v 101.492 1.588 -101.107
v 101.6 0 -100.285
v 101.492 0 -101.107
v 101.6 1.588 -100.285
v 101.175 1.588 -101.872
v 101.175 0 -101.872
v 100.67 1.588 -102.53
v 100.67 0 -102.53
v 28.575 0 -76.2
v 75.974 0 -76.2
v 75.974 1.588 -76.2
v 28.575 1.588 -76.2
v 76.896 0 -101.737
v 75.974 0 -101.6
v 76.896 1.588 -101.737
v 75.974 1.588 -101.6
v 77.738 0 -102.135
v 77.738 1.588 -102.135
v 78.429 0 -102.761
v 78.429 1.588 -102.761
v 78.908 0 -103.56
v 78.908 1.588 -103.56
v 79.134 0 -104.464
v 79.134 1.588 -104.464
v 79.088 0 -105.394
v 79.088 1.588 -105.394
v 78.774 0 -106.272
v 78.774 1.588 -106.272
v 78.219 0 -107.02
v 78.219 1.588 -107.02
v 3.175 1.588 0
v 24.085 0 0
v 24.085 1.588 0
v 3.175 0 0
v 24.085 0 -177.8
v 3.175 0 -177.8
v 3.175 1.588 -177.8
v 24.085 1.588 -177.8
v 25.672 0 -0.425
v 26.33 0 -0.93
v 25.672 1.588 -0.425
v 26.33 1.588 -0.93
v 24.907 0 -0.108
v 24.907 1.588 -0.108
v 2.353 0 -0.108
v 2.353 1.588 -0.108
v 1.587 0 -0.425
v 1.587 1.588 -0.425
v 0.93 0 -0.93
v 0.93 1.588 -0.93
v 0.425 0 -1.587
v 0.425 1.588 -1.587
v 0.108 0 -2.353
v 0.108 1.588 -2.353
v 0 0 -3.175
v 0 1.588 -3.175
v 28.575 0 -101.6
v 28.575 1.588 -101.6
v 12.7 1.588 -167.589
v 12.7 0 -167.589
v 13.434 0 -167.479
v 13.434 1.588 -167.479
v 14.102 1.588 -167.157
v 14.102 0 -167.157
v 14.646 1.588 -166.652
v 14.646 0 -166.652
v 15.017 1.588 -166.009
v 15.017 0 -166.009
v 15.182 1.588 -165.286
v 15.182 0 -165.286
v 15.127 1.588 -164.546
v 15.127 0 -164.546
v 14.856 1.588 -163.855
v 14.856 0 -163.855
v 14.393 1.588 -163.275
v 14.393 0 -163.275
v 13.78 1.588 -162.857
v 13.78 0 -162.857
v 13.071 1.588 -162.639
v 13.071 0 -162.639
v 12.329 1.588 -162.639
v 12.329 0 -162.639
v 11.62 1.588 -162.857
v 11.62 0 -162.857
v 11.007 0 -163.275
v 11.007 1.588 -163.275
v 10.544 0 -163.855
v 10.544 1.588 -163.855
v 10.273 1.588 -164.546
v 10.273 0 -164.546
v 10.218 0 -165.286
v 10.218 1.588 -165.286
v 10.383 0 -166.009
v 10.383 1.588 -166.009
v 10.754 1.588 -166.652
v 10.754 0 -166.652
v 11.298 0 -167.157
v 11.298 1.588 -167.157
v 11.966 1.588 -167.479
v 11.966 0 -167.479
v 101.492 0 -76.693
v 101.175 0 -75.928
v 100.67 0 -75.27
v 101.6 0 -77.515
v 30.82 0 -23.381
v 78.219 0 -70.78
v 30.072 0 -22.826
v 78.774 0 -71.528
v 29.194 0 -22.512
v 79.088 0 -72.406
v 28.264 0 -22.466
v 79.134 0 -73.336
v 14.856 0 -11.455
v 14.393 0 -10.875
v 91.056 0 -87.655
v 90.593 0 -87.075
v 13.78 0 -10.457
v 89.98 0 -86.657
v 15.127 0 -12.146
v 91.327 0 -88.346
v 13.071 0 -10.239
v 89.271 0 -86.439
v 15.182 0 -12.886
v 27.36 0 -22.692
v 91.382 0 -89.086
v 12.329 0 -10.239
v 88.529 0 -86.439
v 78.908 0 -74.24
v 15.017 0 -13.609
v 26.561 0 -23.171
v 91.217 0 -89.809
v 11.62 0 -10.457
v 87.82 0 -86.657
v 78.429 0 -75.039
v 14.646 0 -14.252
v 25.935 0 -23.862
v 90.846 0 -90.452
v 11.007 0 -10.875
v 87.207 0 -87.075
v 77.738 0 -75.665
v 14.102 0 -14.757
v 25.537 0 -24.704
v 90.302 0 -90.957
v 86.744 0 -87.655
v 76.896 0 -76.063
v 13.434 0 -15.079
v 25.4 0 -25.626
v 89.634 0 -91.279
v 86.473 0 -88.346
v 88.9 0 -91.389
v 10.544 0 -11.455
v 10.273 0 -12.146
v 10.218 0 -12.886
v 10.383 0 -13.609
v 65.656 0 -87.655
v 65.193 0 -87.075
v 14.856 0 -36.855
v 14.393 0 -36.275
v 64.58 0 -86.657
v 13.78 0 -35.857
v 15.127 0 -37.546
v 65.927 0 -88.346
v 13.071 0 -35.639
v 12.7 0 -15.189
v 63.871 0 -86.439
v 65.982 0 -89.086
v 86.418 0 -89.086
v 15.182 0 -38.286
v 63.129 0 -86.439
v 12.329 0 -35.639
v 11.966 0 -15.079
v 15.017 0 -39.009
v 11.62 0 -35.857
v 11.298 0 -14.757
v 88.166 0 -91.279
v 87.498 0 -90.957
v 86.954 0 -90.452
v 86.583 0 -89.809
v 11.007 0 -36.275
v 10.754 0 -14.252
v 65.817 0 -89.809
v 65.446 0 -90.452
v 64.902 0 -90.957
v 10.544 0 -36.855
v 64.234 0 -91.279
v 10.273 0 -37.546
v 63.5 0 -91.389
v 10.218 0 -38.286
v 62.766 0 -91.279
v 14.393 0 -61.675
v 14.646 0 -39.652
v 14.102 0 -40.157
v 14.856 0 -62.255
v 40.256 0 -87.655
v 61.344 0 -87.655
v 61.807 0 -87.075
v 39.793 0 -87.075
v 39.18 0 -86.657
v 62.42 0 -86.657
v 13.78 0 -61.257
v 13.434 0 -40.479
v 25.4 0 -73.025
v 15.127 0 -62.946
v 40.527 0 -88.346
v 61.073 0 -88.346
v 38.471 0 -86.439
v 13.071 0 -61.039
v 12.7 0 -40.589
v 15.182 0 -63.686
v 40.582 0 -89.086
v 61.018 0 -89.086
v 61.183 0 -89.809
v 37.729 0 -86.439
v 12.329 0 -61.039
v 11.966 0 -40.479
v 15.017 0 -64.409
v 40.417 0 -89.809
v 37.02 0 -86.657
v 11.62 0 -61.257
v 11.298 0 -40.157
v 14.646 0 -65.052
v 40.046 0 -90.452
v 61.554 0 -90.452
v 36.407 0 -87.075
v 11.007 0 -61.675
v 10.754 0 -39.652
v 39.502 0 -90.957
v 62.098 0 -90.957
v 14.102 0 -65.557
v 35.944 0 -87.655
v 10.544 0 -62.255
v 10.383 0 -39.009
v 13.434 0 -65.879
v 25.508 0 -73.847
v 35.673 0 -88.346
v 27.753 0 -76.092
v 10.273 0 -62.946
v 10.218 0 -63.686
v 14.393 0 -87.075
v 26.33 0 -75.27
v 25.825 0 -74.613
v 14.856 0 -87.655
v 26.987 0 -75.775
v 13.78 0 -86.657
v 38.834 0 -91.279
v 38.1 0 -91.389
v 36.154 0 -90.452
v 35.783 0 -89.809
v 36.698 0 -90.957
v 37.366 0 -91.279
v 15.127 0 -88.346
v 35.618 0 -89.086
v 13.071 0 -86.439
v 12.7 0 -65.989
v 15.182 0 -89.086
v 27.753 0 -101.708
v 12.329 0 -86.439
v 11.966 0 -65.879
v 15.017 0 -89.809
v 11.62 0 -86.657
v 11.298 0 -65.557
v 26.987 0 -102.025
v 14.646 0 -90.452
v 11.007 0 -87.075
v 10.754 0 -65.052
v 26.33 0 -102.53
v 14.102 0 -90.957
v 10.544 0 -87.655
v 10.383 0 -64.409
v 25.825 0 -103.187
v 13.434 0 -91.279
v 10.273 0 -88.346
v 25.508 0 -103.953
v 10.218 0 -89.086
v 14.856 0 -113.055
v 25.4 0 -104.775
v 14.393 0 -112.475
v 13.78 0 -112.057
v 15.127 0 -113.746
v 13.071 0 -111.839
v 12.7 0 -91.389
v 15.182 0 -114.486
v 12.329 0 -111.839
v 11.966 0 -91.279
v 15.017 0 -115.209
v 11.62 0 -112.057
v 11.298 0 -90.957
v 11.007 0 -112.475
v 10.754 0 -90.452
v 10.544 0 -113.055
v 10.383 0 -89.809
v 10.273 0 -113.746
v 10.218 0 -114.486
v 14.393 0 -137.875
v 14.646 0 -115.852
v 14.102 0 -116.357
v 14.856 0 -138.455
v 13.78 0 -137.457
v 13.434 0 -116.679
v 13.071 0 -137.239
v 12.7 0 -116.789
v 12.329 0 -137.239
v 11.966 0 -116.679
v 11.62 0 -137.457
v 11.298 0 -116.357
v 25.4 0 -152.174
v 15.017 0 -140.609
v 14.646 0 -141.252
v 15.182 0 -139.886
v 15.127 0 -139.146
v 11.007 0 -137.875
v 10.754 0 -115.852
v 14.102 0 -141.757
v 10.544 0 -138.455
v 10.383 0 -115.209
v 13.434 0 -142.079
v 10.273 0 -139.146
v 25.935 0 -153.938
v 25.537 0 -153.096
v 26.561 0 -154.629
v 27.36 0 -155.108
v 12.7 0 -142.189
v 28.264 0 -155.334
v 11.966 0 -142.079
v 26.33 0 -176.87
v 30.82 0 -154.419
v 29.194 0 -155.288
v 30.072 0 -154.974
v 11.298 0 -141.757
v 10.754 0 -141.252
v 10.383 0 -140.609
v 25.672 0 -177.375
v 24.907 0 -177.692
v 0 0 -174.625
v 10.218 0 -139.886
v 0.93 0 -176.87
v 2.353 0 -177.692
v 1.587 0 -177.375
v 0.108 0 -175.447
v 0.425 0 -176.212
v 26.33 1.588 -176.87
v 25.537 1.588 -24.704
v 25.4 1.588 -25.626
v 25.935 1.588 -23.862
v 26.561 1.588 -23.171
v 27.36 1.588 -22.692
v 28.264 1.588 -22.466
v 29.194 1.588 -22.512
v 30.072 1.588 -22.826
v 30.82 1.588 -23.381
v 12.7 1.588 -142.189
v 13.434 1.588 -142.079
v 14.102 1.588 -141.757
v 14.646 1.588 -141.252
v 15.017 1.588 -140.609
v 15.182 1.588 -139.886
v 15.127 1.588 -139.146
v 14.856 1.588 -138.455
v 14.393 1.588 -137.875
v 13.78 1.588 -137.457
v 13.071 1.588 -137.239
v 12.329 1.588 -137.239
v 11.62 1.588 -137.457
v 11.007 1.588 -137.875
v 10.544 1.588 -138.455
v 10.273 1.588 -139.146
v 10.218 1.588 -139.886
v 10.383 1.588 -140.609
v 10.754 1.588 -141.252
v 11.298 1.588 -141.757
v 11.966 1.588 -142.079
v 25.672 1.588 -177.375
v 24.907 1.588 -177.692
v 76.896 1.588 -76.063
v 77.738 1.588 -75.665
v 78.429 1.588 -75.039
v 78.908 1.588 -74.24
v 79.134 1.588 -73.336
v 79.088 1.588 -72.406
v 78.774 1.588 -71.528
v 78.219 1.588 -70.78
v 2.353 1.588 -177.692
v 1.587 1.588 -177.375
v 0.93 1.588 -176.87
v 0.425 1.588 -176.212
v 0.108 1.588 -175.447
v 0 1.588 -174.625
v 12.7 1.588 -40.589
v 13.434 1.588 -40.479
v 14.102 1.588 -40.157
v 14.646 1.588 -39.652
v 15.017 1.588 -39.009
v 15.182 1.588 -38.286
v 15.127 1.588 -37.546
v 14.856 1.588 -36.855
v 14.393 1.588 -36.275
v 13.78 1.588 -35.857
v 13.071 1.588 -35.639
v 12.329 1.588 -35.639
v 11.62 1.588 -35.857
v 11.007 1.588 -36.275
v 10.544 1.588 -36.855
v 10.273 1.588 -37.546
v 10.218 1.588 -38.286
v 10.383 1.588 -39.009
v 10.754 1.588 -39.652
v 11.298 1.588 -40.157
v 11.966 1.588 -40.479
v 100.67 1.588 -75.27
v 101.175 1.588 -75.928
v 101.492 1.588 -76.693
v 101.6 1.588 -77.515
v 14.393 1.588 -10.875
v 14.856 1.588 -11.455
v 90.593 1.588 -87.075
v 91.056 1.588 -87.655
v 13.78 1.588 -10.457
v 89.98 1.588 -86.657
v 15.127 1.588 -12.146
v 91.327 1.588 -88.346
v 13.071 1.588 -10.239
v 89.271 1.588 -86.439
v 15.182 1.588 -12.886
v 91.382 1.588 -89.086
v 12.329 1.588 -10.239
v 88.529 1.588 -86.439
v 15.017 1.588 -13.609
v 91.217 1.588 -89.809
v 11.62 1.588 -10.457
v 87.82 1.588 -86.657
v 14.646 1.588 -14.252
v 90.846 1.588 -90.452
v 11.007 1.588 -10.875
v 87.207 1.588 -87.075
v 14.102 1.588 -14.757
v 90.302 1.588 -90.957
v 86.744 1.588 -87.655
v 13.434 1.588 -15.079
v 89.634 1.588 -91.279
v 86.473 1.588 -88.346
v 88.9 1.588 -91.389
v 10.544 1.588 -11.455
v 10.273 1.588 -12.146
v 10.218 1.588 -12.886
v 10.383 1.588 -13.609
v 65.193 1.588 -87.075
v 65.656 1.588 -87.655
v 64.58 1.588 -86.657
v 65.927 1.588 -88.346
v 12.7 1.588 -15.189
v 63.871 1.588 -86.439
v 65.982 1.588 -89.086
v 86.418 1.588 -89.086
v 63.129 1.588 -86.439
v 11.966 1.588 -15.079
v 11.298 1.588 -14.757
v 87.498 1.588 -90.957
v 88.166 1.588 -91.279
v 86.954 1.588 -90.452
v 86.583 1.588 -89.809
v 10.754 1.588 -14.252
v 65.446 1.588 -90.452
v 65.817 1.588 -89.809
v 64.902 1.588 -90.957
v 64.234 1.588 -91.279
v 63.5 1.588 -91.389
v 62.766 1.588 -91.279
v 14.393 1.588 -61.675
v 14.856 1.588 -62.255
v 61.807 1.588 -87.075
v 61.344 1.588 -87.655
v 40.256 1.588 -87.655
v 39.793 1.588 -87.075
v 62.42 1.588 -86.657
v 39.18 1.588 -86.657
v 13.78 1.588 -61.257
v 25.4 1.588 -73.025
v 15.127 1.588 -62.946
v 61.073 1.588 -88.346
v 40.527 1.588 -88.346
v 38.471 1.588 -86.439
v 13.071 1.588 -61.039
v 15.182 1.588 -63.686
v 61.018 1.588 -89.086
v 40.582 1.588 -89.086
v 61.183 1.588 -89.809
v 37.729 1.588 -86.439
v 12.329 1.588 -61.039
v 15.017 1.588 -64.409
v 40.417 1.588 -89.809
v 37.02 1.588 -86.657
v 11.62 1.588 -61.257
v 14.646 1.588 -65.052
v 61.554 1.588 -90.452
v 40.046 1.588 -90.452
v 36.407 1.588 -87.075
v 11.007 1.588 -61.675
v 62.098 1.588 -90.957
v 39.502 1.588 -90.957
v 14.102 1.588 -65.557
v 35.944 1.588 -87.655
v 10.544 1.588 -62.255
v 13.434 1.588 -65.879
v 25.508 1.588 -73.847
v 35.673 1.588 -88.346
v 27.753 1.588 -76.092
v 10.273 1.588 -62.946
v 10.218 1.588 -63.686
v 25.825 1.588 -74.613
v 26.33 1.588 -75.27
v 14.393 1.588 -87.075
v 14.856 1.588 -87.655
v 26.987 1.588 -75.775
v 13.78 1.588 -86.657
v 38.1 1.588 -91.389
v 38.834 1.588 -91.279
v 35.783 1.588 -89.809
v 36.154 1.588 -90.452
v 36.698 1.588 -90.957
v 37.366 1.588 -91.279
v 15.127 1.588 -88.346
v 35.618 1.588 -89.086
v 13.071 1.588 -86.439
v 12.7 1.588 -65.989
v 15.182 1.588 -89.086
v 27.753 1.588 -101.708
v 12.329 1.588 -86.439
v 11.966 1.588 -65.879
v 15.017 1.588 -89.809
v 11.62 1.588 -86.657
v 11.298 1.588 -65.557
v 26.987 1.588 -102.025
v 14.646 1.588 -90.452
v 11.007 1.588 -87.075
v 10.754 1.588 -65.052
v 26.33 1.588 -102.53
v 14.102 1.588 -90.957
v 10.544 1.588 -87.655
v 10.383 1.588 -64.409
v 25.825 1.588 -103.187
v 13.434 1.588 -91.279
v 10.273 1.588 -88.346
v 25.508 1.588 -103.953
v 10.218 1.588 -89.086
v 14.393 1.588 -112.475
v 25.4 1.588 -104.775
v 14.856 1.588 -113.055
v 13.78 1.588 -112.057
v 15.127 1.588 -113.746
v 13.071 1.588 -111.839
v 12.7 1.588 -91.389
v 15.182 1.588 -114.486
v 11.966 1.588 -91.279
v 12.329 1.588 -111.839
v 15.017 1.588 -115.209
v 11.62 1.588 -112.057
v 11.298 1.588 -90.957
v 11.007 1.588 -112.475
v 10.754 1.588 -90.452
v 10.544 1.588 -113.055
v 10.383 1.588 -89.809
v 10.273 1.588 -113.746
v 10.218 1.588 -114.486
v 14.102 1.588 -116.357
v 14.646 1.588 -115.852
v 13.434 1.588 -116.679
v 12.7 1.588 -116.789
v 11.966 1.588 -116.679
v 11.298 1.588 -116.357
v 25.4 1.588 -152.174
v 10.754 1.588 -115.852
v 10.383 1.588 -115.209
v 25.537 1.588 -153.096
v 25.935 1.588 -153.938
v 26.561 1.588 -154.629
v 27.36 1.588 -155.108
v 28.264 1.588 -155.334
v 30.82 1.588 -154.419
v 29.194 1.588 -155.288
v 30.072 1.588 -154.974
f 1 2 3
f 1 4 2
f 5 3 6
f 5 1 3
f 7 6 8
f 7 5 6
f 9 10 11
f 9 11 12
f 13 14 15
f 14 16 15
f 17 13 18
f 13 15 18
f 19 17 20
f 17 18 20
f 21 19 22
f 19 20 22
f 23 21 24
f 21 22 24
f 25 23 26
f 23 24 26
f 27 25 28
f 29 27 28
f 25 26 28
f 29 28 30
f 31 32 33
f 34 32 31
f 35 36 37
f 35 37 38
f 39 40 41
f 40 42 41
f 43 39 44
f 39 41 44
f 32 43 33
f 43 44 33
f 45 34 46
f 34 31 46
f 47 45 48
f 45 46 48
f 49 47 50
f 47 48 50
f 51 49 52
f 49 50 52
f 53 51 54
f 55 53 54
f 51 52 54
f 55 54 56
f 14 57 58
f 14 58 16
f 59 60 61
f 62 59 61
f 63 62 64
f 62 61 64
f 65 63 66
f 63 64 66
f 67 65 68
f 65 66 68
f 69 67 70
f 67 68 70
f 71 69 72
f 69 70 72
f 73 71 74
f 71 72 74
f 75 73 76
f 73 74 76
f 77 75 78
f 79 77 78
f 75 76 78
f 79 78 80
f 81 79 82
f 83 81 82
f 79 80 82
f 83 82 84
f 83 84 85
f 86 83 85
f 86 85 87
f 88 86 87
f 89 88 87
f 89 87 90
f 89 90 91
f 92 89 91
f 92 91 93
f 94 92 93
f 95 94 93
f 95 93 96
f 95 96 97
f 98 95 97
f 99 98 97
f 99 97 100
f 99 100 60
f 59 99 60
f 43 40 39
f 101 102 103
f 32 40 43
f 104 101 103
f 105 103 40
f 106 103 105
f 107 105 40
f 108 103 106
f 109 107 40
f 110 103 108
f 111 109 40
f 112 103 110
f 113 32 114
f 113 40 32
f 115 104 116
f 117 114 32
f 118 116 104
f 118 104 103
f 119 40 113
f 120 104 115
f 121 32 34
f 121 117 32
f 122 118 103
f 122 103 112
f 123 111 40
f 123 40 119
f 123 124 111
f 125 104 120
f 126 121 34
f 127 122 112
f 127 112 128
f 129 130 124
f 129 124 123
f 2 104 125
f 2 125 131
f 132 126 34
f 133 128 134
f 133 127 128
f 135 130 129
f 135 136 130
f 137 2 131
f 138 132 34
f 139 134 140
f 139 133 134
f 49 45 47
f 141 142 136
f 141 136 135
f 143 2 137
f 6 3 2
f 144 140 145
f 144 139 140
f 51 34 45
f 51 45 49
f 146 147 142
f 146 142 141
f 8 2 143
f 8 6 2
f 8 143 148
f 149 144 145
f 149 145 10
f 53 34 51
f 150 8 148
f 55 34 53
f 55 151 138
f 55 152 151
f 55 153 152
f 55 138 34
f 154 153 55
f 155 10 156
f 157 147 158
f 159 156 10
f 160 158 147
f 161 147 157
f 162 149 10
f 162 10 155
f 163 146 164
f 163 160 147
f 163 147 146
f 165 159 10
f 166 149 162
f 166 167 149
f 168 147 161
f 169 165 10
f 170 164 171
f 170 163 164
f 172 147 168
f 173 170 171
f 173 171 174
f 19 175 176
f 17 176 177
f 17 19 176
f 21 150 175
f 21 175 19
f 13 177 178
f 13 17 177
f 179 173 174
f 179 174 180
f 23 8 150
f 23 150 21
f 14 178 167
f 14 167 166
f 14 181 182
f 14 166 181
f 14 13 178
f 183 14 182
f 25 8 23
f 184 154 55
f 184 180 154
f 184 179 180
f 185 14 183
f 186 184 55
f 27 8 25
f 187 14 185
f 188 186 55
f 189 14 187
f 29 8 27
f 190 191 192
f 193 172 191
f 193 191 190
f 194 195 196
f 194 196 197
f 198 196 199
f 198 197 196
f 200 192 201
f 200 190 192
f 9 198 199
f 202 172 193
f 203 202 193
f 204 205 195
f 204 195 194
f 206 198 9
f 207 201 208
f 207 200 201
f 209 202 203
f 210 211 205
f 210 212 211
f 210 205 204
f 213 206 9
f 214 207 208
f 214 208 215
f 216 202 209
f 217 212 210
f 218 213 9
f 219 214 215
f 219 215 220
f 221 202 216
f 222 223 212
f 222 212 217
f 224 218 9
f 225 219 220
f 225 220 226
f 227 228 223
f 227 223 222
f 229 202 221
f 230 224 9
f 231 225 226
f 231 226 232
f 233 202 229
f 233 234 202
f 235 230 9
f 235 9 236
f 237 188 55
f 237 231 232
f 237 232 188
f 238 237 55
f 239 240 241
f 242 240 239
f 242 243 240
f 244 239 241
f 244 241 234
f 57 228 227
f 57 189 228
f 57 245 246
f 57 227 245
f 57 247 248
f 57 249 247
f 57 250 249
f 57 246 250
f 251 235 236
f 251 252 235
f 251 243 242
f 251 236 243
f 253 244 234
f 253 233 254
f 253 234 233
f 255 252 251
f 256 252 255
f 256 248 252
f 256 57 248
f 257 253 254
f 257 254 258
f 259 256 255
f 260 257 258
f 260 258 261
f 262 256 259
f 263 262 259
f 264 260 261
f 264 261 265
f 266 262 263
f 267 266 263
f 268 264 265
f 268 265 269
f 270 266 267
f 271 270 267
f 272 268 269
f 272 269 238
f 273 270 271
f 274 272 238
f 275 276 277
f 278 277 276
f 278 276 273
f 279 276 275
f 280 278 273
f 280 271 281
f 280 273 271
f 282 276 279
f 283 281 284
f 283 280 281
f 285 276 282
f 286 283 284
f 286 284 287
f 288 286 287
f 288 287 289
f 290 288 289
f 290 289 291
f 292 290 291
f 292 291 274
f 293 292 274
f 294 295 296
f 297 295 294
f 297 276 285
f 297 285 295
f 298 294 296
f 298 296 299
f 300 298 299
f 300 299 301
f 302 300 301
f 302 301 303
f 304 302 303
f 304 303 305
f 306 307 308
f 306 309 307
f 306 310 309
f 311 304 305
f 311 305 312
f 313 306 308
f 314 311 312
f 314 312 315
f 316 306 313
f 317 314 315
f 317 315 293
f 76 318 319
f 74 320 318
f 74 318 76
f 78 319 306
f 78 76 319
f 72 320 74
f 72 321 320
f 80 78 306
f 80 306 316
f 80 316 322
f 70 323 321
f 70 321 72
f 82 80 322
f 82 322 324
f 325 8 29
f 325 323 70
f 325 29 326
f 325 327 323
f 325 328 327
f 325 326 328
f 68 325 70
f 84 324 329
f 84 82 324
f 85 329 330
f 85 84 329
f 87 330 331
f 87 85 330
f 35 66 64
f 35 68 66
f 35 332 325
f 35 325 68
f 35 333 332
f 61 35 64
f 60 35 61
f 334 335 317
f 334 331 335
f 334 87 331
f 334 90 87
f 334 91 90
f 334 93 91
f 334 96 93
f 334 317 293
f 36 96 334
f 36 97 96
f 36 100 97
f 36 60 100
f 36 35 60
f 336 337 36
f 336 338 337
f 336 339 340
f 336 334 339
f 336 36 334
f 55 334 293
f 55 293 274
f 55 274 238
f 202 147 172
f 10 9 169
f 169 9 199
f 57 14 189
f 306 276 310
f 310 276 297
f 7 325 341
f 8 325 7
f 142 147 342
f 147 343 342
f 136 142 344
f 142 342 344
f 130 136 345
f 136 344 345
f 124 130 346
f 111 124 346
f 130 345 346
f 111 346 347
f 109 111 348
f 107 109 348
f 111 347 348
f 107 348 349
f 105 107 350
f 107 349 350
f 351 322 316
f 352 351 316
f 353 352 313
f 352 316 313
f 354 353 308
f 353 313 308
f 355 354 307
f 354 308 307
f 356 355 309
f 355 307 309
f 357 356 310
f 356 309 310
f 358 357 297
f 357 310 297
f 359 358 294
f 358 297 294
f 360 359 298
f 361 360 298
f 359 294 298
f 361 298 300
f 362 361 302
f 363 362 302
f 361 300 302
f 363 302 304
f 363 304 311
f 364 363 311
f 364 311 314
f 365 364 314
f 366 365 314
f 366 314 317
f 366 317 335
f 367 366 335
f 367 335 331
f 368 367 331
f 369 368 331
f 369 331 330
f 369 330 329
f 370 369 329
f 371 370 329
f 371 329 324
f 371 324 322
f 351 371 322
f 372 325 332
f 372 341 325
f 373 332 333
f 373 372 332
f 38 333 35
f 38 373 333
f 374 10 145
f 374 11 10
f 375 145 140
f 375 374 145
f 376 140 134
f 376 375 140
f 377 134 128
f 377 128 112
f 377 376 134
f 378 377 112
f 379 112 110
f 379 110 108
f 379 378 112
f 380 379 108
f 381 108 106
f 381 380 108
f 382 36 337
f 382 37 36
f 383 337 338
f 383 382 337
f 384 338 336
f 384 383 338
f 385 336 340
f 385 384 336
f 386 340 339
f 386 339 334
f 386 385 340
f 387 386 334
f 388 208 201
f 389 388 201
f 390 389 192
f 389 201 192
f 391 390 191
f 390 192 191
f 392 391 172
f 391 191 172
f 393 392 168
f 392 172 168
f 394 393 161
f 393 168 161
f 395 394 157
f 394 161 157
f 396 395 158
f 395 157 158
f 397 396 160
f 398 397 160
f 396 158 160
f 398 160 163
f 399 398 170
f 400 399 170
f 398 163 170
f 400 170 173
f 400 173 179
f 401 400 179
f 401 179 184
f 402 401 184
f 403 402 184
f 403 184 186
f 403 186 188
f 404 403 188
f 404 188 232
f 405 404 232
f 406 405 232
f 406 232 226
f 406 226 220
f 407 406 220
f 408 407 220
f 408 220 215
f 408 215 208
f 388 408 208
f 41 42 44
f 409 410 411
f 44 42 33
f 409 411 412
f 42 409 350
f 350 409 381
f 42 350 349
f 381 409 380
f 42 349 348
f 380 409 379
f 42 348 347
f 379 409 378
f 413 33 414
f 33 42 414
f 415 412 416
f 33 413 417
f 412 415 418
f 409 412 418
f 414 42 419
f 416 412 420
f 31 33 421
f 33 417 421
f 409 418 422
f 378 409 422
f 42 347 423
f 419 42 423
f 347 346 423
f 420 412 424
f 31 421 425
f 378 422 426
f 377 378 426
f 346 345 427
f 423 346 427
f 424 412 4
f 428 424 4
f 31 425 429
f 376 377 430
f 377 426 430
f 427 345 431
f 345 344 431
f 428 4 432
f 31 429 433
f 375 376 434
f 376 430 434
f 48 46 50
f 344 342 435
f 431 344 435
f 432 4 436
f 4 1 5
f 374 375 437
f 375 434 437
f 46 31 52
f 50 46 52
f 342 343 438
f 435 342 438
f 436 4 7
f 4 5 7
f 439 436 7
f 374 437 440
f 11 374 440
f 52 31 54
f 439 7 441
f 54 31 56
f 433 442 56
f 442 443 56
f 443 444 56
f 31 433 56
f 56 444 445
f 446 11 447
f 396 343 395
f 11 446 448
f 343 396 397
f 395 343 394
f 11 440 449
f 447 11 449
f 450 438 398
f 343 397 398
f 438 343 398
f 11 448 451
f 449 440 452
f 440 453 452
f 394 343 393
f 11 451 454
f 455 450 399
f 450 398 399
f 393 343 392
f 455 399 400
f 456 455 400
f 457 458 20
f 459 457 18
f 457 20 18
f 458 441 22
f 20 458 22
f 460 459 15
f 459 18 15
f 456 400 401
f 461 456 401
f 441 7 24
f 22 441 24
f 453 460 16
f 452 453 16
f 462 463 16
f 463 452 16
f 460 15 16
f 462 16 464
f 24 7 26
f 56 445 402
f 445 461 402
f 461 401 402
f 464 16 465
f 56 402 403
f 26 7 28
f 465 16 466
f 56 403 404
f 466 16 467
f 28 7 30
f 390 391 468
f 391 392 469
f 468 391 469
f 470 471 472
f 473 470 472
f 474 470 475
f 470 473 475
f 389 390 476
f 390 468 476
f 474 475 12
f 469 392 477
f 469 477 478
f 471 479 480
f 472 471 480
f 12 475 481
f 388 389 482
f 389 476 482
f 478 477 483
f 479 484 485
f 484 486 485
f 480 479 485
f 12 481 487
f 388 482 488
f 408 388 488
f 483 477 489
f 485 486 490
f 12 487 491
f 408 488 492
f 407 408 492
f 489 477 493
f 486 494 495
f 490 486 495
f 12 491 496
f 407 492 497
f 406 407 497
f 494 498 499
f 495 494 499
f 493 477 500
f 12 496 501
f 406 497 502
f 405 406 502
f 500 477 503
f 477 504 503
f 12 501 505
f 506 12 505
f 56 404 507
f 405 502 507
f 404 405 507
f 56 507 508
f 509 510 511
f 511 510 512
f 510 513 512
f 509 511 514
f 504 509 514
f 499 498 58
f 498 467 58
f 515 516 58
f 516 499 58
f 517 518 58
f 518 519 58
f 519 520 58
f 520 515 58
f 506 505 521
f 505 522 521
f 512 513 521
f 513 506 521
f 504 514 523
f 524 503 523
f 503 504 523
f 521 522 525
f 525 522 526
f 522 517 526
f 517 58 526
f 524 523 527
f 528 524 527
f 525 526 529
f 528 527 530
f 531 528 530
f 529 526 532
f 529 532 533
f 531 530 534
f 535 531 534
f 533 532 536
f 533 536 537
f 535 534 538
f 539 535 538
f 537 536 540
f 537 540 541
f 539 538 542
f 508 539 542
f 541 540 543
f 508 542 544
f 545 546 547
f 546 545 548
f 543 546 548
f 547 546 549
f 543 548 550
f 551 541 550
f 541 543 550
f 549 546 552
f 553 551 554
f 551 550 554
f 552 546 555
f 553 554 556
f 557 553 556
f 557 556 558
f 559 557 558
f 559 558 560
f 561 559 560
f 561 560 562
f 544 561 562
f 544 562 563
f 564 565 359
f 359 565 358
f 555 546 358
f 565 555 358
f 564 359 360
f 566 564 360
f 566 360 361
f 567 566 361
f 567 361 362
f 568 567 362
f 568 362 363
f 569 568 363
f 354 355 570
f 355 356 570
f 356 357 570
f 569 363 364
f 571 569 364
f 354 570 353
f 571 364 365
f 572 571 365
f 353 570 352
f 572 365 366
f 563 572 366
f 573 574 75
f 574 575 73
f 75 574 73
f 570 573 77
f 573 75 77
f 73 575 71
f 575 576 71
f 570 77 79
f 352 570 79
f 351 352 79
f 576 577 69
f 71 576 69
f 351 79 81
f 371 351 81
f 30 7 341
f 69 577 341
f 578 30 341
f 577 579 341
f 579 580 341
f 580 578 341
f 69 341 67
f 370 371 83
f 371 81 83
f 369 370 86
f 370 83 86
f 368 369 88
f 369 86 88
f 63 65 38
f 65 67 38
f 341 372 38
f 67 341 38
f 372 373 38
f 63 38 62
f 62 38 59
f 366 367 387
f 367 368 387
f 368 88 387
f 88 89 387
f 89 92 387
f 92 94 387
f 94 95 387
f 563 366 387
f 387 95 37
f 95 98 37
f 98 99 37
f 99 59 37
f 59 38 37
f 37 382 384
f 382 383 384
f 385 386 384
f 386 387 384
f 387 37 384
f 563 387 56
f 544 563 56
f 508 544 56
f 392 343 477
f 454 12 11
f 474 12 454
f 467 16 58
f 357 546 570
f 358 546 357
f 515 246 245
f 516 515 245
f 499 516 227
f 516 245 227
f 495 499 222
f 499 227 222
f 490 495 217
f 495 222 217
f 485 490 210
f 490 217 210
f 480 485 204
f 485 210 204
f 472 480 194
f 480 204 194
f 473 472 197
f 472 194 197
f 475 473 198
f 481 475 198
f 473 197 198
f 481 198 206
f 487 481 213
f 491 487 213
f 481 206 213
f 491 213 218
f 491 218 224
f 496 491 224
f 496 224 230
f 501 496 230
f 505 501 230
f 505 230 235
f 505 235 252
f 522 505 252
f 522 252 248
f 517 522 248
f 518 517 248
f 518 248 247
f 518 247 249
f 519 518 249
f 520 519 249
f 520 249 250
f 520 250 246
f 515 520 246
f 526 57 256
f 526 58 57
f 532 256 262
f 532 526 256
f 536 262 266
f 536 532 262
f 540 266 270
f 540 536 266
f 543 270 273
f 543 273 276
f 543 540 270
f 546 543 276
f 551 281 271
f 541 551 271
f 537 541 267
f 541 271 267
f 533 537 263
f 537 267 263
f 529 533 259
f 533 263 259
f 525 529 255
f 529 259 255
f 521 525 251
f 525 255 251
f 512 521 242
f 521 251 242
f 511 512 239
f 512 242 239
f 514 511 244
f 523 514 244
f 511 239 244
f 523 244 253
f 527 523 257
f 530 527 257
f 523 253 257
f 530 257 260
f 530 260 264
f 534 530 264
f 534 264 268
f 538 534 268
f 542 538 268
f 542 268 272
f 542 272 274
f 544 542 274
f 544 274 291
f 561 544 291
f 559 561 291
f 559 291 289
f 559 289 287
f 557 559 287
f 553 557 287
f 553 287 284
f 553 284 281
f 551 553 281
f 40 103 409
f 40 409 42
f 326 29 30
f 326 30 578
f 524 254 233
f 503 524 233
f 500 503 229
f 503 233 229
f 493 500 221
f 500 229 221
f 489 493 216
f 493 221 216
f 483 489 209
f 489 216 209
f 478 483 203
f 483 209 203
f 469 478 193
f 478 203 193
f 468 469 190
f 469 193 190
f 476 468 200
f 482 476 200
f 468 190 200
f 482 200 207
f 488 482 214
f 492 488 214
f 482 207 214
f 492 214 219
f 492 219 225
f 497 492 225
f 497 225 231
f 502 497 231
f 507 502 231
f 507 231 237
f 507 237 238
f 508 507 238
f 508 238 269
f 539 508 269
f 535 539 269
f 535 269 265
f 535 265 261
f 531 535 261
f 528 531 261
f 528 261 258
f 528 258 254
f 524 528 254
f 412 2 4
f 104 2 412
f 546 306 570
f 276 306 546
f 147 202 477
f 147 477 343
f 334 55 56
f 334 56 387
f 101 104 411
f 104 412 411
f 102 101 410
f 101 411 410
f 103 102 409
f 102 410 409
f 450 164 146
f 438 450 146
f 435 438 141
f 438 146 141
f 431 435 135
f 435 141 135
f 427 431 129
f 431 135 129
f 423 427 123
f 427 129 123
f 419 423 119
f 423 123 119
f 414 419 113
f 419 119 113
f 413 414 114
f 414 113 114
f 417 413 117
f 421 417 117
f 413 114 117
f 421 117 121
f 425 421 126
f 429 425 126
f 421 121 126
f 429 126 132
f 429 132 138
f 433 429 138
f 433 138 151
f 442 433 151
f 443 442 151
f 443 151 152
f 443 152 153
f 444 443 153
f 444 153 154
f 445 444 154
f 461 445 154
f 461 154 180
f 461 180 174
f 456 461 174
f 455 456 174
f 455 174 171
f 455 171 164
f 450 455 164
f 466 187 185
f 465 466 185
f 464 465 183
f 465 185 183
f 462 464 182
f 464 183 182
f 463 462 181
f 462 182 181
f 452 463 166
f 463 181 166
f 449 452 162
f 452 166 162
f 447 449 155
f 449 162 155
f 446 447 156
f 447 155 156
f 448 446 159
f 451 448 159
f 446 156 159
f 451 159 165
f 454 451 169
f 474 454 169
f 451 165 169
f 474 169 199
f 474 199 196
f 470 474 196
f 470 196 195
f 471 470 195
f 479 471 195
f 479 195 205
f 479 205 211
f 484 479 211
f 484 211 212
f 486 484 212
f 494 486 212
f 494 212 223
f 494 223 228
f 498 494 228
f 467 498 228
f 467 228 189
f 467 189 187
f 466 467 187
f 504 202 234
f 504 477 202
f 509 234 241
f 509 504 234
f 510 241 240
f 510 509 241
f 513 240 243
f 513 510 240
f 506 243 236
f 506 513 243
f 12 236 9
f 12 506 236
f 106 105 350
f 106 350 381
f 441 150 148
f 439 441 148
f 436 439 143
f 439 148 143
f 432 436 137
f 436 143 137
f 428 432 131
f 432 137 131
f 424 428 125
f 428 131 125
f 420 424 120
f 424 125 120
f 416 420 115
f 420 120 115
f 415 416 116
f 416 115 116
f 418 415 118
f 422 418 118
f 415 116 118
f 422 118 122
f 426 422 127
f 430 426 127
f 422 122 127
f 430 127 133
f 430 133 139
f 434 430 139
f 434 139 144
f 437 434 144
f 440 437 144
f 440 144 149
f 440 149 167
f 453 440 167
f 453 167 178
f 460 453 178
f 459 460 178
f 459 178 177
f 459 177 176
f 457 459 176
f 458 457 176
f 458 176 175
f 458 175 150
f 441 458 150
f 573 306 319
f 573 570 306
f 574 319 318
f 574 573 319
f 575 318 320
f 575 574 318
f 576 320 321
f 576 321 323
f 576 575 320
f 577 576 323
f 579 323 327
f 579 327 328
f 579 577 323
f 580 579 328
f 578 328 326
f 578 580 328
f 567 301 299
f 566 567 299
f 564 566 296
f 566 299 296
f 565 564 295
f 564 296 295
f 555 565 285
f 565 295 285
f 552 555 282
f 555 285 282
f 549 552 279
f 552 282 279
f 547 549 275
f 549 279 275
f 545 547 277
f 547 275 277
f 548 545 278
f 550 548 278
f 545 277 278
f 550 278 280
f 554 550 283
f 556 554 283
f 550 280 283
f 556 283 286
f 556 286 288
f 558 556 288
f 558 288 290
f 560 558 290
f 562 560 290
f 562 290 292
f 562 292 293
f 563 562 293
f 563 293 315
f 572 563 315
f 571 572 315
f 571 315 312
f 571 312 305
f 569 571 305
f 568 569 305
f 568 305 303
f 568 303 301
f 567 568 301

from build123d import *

# Parameters (mm, degrees)
BOSS_EXTRUDE1_DEPTH        = 1.5875
F_9_0_196_DIAMETER_HOLE1_D = 4.9784
LPATTERN1_COUNT            = 4
LPATTERN1_PITCH            = 25.4
LPATTERN1_COL_COUNT        = 4
LPATTERN1_COL_PITCH        = 25.4
LPATTERN2_COUNT            = 4
LPATTERN2_PITCH            = 25.4
FILLET1_R                  = 3.175


with BuildPart() as part:
    # Sketch1 → Boss-Extrude1 (new body)
    with BuildSketch(Plane(origin=(0, 0, 0), x_dir=(1, 0, 0), z_dir=(0, 1, 0))):
        Polygon((101.6, 101.6), (101.6, 76.2), (25.4, 0), (0, 0), (0, 177.8), (25.4, 177.8), align=None)
        Polygon((25.4, 17.960512242), (83.639487758, 76.2), (25.4, 76.2), align=None, mode=Mode.SUBTRACT)
        Polygon((83.639487758, 101.6), (25.4, 159.839487758), (25.4, 101.6), align=None, mode=Mode.SUBTRACT)
    extrude(amount=BOSS_EXTRUDE1_DEPTH)

    # #9 (0.196) Diameter Hole1 (through all)
    with Locations(Plane(origin=(12.7, 1.5875, -88.9), x_dir=(0, 0, 1), z_dir=(0, 1, 0))):
        with Locations((0, 0)):
            f_9_0_196_diameter_hole1 = Hole(F_9_0_196_DIAMETER_HOLE1_D / 2)

    # LPattern1: #9 (0.196) Diameter Hole1 ×4
    with Locations(*[(0, 0, -i * LPATTERN1_PITCH) for i in range(1, LPATTERN1_COUNT)]):
        add(f_9_0_196_diameter_hole1, mode=Mode.SUBTRACT)

    # LPattern1 col: #9 (0.196) Diameter Hole1 ×4
    with Locations(*[(i * LPATTERN1_COL_PITCH, 0, 0) for i in range(1, LPATTERN1_COL_COUNT)]):
        add(f_9_0_196_diameter_hole1, mode=Mode.SUBTRACT)

    # LPattern2: #9 (0.196) Diameter Hole1 ×4
    with Locations(*[(0, 0, i * LPATTERN2_PITCH) for i in range(1, LPATTERN2_COUNT)]):
        add(f_9_0_196_diameter_hole1, mode=Mode.SUBTRACT)

    # Fillet1
    fillet1_edges = [part.edges().sort_by_distance(p)[0] for p in [
        (101.6, 0.79375, -76.2),
        (25.4, 0.79375, 0),
        (0, 0.79375, 0),
        (0, 0.79375, -177.8),
        (25.4, 0.79375, -177.8),
        (101.6, 0.79375, -101.6),
        (25.4, 0.79375, -159.839487758),
        (25.4, 0.79375, -101.6),
        (83.639487758, 0.79375, -101.6),
        (83.639487758, 0.79375, -76.2),
        (25.4, 0.79375, -76.2),
        (25.4, 0.79375, -17.960512242),
    ]]
    fillet(fillet1_edges, radius=FILLET1_R)


solid = part.part
